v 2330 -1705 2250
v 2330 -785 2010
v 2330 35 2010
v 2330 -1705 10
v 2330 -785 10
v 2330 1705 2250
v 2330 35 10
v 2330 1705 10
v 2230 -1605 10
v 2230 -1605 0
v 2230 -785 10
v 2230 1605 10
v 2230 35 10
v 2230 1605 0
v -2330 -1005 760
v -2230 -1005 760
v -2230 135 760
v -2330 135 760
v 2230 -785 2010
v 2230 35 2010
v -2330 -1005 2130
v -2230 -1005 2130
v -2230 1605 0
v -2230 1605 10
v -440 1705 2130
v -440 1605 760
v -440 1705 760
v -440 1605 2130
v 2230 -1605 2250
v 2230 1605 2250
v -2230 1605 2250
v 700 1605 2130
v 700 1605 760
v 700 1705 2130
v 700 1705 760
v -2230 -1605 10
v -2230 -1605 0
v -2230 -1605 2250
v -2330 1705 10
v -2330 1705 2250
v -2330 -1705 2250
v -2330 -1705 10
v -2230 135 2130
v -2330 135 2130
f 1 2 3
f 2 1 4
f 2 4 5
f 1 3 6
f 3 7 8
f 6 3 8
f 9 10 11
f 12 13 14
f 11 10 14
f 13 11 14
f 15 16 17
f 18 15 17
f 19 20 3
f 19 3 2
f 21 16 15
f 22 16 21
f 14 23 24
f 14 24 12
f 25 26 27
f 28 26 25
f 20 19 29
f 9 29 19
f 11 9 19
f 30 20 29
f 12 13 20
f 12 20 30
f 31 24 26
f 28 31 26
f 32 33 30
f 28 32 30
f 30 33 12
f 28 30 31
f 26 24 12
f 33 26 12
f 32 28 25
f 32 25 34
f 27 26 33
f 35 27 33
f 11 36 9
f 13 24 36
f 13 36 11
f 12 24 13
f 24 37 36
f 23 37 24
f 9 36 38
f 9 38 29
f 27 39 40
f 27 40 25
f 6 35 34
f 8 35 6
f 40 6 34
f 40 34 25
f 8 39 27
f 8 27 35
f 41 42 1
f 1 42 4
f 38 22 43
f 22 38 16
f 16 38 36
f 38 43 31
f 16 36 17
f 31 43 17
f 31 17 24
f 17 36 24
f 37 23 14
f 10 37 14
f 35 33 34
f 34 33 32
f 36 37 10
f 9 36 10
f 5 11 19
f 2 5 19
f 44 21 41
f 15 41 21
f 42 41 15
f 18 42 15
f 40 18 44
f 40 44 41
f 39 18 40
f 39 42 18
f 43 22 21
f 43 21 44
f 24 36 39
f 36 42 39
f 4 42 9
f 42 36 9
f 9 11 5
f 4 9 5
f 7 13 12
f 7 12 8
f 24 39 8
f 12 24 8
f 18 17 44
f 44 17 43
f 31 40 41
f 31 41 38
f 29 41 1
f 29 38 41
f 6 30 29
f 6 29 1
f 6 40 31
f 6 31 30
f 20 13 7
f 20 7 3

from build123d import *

# Parameters (mm, degrees)
F0_W     = 4460
F0_H     = 3210
F1_DEPTH = 10
F2_W     = 4660
F2_H     = 3410
F2_W_2   = 4460
F2_H_2   = 3210
F3_DEPTH = 2240
F4_W     = 1140
F4_H     = 1370
F5_DEPTH = 300
F6_W     = 1140
F6_H     = 1370
F7_DEPTH = 300
F8_W     = 820
F8_H     = 2000
F9_DEPTH = 150


with BuildPart() as f1:
    # F0 (on Top) → F1 (new body)
    with BuildSketch(Plane.XY):
        Rectangle(F0_W, F0_H)
    extrude(amount=F1_DEPTH)

    # F2 (on face) → F3 (join)
    with BuildSketch(Plane.XY.offset(10)):
        Rectangle(F2_W, F2_H)
        Rectangle(F2_W_2, F2_H_2, mode=Mode.SUBTRACT)
    extrude(amount=F3_DEPTH)

    # F4 (on face) → F5 (cut)
    with BuildSketch(Plane.YZ.offset(-2230)):
        with Locations((-435, 1445)):
            Rectangle(F4_W, F4_H)
    extrude(amount=-F5_DEPTH, mode=Mode.SUBTRACT)

    # F6 (on face) → F7 (cut)
    with BuildSketch(Plane.XZ.offset(-1605)):
        with Locations((130, 1445)):
            Rectangle(F6_W, F6_H)
    extrude(amount=-F7_DEPTH, mode=Mode.SUBTRACT)

    # F8 (on face) → F9 (cut)
    with BuildSketch(Plane(origin=(2230, 0, 0), x_dir=(0, -1, 0), z_dir=(-1, 0, 0))):
        with Locations((375, 1010)):
            Rectangle(F8_W, F8_H)
    extrude(amount=-F9_DEPTH, mode=Mode.SUBTRACT)


solid = f1.part
